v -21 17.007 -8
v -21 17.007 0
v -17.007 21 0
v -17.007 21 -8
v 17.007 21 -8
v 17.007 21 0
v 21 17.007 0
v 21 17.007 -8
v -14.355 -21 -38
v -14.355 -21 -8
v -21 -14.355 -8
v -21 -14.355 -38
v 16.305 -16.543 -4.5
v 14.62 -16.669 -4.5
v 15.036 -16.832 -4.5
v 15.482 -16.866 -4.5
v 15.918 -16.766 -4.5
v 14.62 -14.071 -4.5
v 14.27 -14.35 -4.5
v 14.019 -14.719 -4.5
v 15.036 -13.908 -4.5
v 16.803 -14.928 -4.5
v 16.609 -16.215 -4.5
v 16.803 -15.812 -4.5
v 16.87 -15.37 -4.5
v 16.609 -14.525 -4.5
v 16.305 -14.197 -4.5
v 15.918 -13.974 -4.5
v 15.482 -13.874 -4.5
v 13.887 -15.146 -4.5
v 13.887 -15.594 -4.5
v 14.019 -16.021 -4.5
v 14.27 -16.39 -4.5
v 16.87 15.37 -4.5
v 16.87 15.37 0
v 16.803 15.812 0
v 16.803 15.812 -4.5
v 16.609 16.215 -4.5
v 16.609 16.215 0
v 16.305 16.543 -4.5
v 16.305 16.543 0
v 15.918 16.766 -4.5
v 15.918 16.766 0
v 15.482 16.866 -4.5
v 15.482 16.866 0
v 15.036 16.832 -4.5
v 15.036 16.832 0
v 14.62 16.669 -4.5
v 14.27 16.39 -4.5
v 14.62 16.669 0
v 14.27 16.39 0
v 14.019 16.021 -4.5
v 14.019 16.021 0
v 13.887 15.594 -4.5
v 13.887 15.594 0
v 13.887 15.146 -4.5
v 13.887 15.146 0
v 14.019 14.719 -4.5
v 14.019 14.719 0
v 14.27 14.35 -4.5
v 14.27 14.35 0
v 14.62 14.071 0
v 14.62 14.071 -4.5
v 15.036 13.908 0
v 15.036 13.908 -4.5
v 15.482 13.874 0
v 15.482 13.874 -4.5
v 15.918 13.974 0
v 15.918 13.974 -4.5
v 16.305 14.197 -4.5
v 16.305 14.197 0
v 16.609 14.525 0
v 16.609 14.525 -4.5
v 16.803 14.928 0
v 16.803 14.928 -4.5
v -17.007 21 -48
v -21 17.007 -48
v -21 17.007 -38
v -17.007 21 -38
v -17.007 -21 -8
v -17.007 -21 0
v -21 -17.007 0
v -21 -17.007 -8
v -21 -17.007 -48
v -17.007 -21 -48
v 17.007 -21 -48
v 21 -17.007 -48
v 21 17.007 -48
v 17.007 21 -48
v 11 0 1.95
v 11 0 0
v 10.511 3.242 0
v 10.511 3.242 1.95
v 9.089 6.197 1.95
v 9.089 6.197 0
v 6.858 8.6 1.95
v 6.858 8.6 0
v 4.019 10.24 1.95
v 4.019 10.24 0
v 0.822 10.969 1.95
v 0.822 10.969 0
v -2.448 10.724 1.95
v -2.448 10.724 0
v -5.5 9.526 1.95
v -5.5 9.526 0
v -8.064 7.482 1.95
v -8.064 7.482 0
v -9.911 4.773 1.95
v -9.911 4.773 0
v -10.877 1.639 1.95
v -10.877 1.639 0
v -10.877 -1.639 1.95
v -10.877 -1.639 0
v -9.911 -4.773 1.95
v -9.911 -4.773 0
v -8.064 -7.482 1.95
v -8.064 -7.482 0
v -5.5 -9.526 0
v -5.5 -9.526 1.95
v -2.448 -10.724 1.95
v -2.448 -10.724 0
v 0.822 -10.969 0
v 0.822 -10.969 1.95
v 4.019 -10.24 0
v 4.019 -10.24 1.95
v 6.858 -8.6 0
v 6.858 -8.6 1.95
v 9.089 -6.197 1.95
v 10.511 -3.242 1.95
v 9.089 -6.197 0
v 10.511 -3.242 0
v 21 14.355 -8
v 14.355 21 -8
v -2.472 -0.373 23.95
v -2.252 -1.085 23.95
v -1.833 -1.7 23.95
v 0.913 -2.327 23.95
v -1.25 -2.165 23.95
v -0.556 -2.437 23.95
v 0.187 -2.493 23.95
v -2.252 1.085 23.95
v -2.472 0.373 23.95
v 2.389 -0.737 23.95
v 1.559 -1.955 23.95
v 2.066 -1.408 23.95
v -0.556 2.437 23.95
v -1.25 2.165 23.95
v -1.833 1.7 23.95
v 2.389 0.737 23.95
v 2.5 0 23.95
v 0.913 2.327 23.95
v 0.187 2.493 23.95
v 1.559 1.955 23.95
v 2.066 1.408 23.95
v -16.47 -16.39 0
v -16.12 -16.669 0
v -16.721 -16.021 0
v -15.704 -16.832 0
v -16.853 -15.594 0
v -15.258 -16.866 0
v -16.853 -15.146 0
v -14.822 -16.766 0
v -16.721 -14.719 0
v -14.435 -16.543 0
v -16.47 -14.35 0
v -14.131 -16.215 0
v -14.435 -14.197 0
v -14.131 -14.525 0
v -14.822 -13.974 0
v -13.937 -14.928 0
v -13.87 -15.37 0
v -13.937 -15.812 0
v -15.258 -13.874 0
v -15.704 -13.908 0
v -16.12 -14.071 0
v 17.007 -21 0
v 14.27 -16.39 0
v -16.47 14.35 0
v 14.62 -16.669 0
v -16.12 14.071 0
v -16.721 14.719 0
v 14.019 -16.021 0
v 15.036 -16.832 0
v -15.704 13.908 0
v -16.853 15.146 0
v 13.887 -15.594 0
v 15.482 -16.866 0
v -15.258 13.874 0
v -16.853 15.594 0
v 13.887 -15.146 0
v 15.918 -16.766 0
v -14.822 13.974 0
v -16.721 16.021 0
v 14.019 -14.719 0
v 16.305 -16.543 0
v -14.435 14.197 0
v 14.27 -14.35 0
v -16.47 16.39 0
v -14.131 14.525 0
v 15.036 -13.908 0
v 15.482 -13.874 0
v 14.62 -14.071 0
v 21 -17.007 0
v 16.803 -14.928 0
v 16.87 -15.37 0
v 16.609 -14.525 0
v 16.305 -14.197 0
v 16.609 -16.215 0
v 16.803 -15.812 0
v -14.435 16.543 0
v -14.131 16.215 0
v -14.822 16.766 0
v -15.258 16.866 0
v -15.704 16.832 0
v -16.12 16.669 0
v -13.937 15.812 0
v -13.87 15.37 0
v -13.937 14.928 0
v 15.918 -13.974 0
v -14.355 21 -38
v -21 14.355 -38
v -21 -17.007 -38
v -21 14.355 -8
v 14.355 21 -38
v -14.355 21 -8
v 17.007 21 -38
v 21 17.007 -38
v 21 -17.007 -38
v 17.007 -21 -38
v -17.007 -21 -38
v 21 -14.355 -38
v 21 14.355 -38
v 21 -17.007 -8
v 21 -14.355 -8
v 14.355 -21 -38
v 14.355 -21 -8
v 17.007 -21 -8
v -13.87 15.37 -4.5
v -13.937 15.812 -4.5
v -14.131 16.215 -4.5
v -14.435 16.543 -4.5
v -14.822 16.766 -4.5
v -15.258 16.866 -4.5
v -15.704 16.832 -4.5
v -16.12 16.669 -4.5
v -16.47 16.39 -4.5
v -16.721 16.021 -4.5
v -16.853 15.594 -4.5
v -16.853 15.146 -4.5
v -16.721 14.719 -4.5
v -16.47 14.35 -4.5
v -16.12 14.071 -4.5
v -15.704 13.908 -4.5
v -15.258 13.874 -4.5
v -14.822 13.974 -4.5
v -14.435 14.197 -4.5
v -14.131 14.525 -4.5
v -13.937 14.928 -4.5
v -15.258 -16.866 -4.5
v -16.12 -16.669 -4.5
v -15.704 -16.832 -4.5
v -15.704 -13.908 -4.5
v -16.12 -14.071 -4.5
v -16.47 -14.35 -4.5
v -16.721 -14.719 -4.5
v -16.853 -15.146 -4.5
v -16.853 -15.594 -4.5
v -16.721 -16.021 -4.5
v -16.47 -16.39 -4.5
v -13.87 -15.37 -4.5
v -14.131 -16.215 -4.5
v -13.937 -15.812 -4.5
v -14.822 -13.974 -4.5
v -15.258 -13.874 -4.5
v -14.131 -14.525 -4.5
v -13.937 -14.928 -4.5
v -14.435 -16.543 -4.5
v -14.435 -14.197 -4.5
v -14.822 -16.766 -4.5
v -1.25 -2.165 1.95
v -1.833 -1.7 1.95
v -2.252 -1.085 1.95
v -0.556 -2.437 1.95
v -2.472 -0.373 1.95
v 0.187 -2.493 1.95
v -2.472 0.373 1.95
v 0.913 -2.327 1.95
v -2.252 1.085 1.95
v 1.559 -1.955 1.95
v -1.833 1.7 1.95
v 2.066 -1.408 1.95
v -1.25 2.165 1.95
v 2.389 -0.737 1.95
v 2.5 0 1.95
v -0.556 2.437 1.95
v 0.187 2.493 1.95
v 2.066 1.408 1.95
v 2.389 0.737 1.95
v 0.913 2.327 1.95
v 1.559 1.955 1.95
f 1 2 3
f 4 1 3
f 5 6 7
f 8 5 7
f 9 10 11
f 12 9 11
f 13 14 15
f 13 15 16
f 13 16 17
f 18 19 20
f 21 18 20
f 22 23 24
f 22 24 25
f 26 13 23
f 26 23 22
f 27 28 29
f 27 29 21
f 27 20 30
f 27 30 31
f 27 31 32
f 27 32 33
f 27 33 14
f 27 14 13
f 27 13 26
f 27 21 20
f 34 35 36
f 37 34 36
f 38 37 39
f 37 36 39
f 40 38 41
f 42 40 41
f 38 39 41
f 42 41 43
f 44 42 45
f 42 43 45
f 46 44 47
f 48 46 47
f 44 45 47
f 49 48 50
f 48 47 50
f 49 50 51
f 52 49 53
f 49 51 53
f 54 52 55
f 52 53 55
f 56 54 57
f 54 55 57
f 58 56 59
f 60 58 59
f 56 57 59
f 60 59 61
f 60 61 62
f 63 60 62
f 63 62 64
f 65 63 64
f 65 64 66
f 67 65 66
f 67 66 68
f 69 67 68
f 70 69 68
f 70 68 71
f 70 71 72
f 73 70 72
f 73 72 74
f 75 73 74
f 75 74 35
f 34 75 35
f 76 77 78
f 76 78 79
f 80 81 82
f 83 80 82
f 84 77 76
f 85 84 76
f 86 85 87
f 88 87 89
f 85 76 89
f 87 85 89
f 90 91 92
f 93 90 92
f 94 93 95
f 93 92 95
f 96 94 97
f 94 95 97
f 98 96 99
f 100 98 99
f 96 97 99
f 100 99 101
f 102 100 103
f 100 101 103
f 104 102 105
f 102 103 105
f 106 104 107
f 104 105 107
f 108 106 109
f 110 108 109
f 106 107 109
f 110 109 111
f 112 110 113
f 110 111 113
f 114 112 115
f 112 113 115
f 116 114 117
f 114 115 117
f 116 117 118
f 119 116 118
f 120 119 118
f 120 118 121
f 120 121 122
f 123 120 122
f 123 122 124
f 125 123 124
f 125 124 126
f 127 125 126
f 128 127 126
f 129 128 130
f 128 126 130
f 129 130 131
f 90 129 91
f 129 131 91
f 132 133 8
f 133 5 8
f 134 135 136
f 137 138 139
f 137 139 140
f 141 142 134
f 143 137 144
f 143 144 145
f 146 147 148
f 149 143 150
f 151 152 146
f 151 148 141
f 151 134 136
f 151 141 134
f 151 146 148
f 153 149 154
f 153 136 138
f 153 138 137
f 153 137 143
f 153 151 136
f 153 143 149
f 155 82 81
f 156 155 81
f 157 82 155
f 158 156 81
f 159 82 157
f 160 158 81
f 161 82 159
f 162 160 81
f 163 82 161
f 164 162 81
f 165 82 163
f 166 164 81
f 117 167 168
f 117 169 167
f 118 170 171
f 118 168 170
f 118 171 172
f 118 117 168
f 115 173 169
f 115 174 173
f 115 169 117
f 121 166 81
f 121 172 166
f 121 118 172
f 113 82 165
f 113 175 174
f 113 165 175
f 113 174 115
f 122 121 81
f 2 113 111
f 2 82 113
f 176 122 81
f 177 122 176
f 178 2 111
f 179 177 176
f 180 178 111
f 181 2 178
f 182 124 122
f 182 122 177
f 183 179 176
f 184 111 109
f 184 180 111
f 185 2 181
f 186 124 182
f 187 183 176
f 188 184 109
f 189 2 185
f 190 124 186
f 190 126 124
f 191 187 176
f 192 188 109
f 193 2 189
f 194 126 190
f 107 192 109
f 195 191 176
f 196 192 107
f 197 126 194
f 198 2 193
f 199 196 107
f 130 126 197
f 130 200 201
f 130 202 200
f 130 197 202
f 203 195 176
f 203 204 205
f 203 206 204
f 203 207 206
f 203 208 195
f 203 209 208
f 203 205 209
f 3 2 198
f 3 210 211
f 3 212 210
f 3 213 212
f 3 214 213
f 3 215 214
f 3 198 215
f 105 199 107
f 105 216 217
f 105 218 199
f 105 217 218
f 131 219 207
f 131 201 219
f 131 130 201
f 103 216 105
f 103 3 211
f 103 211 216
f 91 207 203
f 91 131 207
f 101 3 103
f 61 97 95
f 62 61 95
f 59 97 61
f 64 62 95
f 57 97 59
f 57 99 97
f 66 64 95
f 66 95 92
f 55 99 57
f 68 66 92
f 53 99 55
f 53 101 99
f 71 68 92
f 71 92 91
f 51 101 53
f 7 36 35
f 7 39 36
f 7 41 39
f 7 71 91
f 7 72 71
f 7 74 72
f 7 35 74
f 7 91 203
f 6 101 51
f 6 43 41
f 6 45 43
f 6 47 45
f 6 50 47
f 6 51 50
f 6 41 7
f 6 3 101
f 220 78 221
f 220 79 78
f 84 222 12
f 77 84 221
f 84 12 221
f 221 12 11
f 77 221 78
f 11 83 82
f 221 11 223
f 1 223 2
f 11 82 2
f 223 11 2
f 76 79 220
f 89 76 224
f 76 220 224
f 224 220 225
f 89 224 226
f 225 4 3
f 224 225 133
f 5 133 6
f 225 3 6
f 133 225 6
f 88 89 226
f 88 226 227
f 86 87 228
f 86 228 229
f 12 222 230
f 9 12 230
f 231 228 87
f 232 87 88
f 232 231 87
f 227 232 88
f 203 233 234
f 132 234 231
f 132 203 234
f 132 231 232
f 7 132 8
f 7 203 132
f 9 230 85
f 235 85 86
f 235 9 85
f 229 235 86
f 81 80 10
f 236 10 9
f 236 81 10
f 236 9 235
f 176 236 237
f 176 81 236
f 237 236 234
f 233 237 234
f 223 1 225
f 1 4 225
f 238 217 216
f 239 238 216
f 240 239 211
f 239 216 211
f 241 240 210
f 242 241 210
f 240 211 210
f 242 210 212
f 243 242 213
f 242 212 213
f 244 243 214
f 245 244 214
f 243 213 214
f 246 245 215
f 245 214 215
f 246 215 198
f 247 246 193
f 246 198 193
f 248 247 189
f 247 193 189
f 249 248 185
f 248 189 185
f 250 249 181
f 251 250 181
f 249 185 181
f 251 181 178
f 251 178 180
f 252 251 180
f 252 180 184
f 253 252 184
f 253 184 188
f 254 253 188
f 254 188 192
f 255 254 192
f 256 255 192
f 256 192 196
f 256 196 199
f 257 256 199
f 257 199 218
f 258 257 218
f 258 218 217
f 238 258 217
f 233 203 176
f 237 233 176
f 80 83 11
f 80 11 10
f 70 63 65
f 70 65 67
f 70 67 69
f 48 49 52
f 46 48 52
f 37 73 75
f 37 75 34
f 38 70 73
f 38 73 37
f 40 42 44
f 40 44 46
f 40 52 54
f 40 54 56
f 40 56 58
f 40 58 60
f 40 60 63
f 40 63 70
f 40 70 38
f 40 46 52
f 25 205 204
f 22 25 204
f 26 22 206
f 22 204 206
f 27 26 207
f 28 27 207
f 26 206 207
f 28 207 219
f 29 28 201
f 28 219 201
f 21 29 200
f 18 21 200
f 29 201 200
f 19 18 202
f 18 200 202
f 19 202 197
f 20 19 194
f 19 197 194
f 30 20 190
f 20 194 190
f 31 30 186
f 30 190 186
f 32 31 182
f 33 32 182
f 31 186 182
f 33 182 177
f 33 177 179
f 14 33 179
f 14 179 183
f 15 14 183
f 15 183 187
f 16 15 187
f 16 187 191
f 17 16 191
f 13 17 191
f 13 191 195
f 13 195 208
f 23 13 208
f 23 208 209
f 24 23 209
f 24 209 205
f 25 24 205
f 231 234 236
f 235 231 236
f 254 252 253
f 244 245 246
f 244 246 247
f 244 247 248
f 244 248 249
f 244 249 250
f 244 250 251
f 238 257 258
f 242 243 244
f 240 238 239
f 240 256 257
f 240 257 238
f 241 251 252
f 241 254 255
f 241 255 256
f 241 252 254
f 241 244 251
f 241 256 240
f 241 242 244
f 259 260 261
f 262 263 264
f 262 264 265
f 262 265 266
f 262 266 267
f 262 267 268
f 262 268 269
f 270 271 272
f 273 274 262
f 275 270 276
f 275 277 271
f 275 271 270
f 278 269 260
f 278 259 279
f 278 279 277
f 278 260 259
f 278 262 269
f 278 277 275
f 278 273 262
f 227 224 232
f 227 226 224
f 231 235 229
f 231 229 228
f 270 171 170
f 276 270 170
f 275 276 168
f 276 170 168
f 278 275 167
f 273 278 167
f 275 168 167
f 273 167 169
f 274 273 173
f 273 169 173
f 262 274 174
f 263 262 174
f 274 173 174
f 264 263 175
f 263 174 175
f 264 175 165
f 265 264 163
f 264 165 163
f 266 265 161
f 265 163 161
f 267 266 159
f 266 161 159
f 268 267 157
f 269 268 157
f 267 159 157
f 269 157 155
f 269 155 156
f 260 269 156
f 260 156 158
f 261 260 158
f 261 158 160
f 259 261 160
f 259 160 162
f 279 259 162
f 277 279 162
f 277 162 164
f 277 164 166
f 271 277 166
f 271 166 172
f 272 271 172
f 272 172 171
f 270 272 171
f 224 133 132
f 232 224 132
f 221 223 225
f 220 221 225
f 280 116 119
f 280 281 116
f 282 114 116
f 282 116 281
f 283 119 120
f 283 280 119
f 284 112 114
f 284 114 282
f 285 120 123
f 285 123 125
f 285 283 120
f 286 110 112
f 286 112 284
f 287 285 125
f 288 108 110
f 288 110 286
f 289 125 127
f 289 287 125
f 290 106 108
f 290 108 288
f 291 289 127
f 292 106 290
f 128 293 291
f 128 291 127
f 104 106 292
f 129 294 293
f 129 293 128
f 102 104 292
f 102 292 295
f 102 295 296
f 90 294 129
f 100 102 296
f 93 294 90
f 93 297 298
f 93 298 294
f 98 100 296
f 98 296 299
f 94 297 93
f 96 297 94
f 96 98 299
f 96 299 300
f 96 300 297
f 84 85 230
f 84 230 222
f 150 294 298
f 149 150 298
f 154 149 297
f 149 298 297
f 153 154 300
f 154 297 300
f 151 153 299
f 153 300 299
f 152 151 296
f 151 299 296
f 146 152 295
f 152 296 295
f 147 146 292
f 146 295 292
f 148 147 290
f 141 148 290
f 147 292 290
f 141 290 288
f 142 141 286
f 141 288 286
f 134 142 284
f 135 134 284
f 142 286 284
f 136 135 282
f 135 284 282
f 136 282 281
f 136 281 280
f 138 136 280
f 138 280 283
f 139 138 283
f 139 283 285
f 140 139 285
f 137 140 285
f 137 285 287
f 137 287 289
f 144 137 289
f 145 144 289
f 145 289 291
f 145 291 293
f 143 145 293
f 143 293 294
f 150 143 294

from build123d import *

# Parameters (mm, degrees)
F0_W      = 42
F0_H      = 42
F0_R      = 1.5
F0_R_2    = 11
F0_R_3    = 2.5
F1_DEPTH  = 48
F2_DEPTH  = 1.95
F4_DEPTH  = 23.95
F6_DEPTH  = 48.001
F10_DEPTH = 30
F12_R     = 1.5
F13_DEPTH = 43.5


with BuildPart() as f1:
    # F0 (on Top) → F1 (new body)
    with BuildSketch(Plane.XY):
        Rectangle(F0_W, F0_H)
        with Locations((-15.37, -15.37)):
            Circle(F0_R, mode=Mode.SUBTRACT)
        with Locations((15.37, -15.37)):
            Circle(F0_R, mode=Mode.SUBTRACT)
        with Locations((-15.37, 15.37)):
            Circle(F0_R, mode=Mode.SUBTRACT)
        Circle(F0_R_2, mode=Mode.SUBTRACT)
        with Locations((15.37, 15.37)):
            Circle(F0_R, mode=Mode.SUBTRACT)
        Circle(F0_R_2)
        Circle(F0_R_3, mode=Mode.SUBTRACT)
        Circle(F0_R_3)
    extrude(amount=-F1_DEPTH)

    # F0 (on Top) → F2 (join)
    with BuildSketch(Plane.XY):
        Circle(F0_R_2)
        Circle(F0_R_3, mode=Mode.SUBTRACT)
        Circle(F0_R_3)
    extrude(amount=F2_DEPTH)

    # F0 (on Top) → F4 (join, through all)
    with BuildSketch(Plane.XY):
        Circle(F0_R_3)
    extrude(amount=F4_DEPTH)

    # F5 (on face) → F6 (cut, through all)
    with BuildSketch(Plane.XY):
        Polygon((-21, 17.0069894888), (-17.0069894888, 21), (-21, 21), align=None)
        Polygon((-21, -21), (-17.0069894888, -21), (-21, -17.0069894888), align=None)
        Polygon((17.0069894888, 21), (21, 17.0069894888), (21, 21), align=None)
        Polygon((21, -21), (21, -17.0069894888), (17.0069894888, -21), align=None)
    extrude(amount=-F6_DEPTH, mode=Mode.SUBTRACT)

    # F9 (on offset) → F10 (cut, through all)
    with BuildSketch(Plane.XY.offset(-38)):
        Polygon((21, -14.3553390593), (14.3553390593, -21), (17.0069894888, -21), (21, -17.0069894888), align=None)
        Polygon((-21, 17.0069894888), (-21, 14.3553390593), (-14.3553390593, 21), (-17.0069894888, 21), align=None)
        Polygon((-17.0069894888, -21), (-14.3553390593, -21), (-21, -14.3553390593), (-21, -17.0069894888), align=None)
        Polygon((14.3553390593, 21), (21, 14.3553390593), (21, 17.0069894888), (17.0069894888, 21), align=None)
    extrude(amount=F10_DEPTH, mode=Mode.SUBTRACT)

    # F12 (on offset) → F13 (join, through all)
    with BuildSketch(Plane.XY.offset(-4.5)):
        with Locations((-15.37, 15.37)):
            Circle(F12_R)
        with Locations((15.37, 15.37)):
            Circle(F12_R)
        with Locations((15.37, -15.37)):
            Circle(F12_R)
        with Locations((-15.37, -15.37)):
            Circle(F12_R)
    extrude(amount=-F13_DEPTH)


solid = f1.part
